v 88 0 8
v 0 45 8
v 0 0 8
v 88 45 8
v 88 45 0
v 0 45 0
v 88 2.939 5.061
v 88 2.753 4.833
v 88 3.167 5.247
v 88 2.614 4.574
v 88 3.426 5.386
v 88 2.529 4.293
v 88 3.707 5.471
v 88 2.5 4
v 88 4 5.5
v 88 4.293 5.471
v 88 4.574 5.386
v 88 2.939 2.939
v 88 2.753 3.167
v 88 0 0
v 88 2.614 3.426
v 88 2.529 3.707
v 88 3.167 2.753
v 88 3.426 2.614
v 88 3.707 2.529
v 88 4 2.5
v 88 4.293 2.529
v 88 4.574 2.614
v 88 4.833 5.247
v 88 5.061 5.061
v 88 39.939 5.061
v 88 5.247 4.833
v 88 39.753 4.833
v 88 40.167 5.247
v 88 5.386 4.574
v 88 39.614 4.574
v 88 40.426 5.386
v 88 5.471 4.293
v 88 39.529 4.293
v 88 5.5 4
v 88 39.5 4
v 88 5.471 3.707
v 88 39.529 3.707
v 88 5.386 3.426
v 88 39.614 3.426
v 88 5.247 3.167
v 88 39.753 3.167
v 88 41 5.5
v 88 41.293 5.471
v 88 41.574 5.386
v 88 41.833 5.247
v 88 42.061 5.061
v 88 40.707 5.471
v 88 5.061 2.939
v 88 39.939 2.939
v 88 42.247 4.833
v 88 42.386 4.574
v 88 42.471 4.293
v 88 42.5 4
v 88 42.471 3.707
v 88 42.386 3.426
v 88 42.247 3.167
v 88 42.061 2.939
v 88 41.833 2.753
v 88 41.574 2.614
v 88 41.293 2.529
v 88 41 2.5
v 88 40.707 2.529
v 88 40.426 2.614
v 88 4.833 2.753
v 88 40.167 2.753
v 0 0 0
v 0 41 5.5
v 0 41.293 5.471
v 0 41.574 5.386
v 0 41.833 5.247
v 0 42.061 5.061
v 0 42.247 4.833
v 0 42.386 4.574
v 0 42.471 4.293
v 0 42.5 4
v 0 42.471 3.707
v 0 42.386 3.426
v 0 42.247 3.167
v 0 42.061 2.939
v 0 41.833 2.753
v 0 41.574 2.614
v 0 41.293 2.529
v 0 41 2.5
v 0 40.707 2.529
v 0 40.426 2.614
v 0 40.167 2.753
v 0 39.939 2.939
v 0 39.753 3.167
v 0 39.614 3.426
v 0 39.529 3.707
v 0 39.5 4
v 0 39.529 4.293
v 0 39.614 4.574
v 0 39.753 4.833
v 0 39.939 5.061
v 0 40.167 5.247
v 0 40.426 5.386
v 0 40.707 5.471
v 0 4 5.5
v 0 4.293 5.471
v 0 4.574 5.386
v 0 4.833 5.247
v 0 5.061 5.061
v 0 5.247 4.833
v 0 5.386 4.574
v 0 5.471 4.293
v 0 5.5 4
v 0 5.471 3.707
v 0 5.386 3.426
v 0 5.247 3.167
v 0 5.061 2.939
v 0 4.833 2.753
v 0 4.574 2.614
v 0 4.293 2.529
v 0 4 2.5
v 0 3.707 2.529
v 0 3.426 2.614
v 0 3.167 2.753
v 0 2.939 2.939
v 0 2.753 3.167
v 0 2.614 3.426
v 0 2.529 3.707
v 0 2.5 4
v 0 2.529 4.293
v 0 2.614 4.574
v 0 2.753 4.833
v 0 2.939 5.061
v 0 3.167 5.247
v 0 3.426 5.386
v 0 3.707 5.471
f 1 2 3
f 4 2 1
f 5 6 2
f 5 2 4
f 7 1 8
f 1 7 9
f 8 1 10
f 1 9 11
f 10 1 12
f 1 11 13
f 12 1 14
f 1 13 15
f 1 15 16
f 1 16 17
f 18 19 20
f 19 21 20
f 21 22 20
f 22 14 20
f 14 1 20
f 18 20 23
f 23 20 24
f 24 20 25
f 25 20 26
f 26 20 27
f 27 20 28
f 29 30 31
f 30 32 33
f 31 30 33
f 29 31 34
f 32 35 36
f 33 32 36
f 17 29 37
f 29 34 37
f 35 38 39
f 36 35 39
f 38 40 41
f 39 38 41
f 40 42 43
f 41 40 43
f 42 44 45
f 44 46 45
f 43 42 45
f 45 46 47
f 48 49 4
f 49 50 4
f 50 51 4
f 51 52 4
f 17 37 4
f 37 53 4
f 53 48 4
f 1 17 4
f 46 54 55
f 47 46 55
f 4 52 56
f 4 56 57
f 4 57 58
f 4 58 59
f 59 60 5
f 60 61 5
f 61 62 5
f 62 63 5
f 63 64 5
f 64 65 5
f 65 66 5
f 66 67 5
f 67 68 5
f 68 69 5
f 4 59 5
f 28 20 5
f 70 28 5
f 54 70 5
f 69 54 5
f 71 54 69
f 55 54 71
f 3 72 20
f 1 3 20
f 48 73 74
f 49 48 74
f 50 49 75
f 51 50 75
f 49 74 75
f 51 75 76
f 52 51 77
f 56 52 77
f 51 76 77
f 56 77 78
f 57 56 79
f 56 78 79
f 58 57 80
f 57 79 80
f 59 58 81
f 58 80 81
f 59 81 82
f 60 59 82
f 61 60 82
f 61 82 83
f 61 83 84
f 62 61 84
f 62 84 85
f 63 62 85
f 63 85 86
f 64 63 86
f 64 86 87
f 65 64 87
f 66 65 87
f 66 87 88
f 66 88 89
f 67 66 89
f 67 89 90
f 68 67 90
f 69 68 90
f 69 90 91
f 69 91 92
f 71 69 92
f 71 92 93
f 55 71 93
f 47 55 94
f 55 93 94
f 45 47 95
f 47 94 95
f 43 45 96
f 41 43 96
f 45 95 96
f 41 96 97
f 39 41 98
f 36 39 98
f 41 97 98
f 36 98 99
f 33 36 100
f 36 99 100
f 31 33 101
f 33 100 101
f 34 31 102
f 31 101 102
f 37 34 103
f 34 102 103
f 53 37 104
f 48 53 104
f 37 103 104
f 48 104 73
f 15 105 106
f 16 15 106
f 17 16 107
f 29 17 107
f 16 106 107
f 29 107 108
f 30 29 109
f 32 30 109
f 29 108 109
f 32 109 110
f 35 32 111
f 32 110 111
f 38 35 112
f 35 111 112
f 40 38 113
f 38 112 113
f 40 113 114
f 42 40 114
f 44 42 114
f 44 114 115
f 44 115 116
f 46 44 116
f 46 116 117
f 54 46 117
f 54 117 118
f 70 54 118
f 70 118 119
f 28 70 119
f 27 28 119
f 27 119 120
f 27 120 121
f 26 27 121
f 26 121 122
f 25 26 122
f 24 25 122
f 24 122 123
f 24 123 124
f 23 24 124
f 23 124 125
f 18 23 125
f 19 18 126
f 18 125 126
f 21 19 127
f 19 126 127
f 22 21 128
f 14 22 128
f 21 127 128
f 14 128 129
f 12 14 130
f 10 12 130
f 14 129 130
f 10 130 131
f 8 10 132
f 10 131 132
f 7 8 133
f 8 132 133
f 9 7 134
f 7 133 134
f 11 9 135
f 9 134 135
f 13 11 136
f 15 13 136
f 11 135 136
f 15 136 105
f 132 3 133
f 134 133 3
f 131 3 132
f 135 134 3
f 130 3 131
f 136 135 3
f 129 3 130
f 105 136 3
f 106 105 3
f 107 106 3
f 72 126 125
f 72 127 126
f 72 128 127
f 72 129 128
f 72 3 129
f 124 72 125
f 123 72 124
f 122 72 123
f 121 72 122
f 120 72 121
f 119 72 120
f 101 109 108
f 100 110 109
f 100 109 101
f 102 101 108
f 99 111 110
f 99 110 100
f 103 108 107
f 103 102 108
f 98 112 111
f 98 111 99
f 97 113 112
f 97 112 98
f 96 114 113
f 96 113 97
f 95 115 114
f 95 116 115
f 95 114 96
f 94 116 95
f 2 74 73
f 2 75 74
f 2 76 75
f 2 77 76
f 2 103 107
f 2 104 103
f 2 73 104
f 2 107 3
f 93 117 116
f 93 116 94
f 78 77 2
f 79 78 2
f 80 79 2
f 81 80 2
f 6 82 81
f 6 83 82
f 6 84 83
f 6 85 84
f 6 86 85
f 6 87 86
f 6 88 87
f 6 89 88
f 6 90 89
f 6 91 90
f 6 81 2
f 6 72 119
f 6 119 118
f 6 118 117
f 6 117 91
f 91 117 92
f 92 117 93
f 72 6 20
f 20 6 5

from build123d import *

# Parameters (mm, degrees)
SKETCH1_W           = 88
SKETCH1_H           = 45
BOSS_EXTRUDE1_DEPTH = 8
SKETCH2_R           = 1.5
CUT_EXTRUDE1_DEPTH  = 144


with BuildPart() as part:
    # Sketch1 → Boss-Extrude1 (new body)
    with BuildSketch(Plane.XY):
        with Locations((44, 22.5)):
            Rectangle(SKETCH1_W, SKETCH1_H)
    extrude(amount=BOSS_EXTRUDE1_DEPTH)

    # Sketch2 → Cut-Extrude1 (cut)
    with BuildSketch(Plane.ZY):
        with Locations((4, 41)):
            Circle(SKETCH2_R)
        with Locations((4, 4)):
            Circle(SKETCH2_R)
    extrude(amount=-CUT_EXTRUDE1_DEPTH, mode=Mode.SUBTRACT)


solid = part.part
